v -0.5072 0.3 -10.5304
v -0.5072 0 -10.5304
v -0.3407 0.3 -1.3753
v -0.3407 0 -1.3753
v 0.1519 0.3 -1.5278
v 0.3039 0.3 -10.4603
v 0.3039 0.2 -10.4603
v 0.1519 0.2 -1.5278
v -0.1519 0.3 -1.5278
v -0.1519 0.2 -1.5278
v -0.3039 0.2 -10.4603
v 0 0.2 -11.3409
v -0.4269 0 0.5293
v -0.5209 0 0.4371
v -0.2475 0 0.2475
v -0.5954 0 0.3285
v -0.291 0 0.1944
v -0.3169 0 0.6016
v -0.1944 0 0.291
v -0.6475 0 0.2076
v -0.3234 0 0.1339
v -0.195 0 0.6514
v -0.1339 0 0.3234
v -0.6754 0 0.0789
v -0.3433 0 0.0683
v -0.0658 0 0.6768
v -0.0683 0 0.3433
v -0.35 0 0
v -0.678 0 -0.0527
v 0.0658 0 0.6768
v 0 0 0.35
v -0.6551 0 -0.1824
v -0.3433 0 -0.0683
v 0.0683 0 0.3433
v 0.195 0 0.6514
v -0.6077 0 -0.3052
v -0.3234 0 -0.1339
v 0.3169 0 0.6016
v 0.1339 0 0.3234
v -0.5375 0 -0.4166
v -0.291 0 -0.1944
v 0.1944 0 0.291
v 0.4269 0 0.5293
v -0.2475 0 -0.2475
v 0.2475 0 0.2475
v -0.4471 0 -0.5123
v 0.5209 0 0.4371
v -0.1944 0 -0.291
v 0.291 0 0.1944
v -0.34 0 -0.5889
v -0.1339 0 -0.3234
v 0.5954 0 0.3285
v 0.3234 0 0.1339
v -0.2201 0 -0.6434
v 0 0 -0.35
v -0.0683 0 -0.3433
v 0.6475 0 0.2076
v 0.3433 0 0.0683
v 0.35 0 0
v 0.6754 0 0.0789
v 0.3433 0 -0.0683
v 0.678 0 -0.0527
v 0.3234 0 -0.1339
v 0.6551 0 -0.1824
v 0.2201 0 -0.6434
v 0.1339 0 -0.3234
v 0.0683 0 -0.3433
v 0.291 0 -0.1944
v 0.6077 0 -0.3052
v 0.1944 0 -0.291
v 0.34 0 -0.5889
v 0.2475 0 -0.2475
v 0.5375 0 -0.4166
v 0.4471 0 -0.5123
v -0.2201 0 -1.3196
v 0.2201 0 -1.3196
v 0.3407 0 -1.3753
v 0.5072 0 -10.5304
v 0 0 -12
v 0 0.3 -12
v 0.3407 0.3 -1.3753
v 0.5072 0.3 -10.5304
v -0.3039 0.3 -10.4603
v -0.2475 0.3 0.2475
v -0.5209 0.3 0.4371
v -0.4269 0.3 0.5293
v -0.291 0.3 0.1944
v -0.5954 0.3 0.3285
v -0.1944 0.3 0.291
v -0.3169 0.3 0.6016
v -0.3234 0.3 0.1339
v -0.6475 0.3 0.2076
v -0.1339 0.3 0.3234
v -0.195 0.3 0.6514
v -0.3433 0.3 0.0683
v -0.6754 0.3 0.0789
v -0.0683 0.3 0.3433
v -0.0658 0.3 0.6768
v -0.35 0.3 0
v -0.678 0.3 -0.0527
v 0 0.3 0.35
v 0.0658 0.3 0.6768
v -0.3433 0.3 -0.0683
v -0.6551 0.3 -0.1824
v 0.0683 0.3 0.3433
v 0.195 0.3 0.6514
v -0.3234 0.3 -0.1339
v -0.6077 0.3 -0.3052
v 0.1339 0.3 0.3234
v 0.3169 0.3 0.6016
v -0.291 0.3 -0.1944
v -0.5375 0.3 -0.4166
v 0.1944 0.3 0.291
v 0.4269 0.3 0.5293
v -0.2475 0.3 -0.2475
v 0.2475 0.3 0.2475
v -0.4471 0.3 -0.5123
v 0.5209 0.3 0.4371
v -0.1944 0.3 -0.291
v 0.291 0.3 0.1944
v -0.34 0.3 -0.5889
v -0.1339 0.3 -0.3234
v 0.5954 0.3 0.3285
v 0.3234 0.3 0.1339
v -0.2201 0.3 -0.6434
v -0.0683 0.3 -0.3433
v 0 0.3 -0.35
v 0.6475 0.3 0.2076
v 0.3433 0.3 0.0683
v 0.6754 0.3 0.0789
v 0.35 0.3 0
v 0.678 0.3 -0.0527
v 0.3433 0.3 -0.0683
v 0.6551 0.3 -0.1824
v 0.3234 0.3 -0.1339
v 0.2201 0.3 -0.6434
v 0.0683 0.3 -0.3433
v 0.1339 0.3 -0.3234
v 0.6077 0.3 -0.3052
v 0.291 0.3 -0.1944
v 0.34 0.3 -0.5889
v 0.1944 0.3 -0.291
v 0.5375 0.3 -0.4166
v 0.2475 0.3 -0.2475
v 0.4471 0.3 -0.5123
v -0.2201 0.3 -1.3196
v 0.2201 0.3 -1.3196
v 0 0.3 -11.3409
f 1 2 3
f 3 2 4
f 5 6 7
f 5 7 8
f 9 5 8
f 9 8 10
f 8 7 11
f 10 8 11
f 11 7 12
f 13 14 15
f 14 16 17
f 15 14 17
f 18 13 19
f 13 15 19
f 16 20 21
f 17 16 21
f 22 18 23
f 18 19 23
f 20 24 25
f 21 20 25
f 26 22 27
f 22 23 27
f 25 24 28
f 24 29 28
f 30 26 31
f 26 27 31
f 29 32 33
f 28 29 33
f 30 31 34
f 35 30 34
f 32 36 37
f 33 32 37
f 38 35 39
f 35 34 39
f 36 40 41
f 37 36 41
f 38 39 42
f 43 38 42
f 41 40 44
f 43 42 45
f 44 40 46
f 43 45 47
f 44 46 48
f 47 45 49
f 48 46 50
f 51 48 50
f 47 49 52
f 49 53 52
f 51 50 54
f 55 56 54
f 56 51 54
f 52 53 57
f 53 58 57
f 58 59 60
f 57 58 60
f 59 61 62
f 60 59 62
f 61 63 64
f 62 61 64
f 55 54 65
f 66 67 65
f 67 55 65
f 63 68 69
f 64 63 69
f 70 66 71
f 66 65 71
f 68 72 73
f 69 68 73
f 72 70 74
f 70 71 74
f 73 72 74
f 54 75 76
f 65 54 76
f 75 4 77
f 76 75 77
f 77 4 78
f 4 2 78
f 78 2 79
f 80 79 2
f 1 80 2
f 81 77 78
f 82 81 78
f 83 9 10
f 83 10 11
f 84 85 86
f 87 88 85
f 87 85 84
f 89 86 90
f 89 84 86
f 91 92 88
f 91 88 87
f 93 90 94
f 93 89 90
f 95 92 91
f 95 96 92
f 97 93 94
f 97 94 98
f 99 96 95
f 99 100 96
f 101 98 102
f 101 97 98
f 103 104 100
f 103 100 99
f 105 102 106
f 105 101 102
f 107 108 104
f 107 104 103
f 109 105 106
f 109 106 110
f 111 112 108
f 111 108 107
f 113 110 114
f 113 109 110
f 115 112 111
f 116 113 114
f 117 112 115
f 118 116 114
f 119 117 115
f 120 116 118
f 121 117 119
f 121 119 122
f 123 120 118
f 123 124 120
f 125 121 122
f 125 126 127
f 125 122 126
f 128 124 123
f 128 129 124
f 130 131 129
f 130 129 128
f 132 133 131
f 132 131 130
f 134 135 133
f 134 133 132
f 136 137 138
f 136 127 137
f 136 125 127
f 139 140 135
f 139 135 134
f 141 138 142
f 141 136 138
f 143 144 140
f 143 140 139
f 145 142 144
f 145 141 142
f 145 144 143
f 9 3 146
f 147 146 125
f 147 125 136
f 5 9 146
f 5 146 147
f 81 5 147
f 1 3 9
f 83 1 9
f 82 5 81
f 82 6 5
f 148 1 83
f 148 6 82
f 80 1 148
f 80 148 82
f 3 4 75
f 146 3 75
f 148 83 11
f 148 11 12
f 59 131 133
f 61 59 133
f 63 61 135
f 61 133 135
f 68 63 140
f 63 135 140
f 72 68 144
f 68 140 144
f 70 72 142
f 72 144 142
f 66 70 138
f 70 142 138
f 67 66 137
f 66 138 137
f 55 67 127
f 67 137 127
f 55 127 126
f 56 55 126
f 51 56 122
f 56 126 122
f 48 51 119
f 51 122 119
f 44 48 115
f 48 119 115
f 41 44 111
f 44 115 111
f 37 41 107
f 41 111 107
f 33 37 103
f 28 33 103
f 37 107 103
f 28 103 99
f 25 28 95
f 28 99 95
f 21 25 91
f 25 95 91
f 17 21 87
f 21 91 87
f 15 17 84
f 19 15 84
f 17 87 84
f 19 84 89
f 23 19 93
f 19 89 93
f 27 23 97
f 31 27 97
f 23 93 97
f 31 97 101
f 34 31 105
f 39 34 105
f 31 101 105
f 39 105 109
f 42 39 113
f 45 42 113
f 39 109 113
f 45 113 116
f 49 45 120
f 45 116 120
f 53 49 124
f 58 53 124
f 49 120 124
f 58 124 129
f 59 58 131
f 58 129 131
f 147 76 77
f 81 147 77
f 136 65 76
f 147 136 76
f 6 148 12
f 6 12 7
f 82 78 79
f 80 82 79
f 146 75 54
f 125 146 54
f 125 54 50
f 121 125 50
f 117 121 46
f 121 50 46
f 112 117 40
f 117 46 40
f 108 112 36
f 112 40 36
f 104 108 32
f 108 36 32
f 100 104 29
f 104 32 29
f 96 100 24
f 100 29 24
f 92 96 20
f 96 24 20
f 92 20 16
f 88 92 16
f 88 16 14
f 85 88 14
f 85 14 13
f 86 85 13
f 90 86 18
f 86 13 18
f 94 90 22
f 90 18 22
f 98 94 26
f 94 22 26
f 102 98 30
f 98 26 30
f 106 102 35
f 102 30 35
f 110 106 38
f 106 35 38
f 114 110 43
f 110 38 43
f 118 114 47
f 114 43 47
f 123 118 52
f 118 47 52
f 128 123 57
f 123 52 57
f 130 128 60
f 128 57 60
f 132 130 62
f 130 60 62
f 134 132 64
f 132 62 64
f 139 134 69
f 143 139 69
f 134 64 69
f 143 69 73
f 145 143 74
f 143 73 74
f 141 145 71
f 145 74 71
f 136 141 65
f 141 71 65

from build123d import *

# Parameters (mm, degrees)
BOSS_EXTRUDE1_DEPTH = 0.3
SKETCH2_R           = 0.35
CUT_EXTRUDE1_DEPTH  = 0.3
CUT_EXTRUDE2_DEPTH  = 0.1


with BuildPart() as part:
    # Sketch1 → Boss-Extrude1 (new body)
    with BuildSketch(Plane(origin=(0, 0, 0), x_dir=(1, 0, 0), z_dir=(0, 1, 0))):
        with BuildLine():
            Line((-0.220137797, 1.319636721), (-0.220137797, 0.643381186))
            ThreePointArc((-0.220137797, 0.643381186), (0, -0.68), (0.220137797, 0.643381186))
            Line((0.220137797, 0.643381186), (0.220137797, 1.319636721))
            Line((0.220137797, 1.319636721), (0.34069528, 1.375278636))
            Line((0.34069528, 1.375278636), (0.507155702, 10.530443548))
            Line((0.507155702, 10.530443548), (0, 12))
            Line((0, 12), (-0.507155702, 10.530443548))
            Line((-0.507155702, 10.530443548), (-0.34069528, 1.375278636))
            Line((-0.34069528, 1.375278636), (-0.220137797, 1.319636721))
        make_face()
    extrude(amount=BOSS_EXTRUDE1_DEPTH)

    # Sketch2 → Cut-Extrude1 (cut)
    with BuildSketch(Plane(origin=(0, 0.3, 0), x_dir=(1, 0, 0), z_dir=(0, 1, 0))):
        Circle(SKETCH2_R)
    extrude(amount=-CUT_EXTRUDE1_DEPTH, mode=Mode.SUBTRACT)

    # Sketch3 → Cut-Extrude2 (cut)
    with BuildSketch(Plane(origin=(0, 0.3, 0), x_dir=(1, 0, 0), z_dir=(0, 1, 0))):
        Polygon((0, 11.340864844), (0.303891547, 10.460295461), (0.151945774, 1.527775516), (-0.151945774, 1.527775516), (-0.303891547, 10.460295461), align=None)
    extrude(amount=-CUT_EXTRUDE2_DEPTH, mode=Mode.SUBTRACT)


solid = part.part
